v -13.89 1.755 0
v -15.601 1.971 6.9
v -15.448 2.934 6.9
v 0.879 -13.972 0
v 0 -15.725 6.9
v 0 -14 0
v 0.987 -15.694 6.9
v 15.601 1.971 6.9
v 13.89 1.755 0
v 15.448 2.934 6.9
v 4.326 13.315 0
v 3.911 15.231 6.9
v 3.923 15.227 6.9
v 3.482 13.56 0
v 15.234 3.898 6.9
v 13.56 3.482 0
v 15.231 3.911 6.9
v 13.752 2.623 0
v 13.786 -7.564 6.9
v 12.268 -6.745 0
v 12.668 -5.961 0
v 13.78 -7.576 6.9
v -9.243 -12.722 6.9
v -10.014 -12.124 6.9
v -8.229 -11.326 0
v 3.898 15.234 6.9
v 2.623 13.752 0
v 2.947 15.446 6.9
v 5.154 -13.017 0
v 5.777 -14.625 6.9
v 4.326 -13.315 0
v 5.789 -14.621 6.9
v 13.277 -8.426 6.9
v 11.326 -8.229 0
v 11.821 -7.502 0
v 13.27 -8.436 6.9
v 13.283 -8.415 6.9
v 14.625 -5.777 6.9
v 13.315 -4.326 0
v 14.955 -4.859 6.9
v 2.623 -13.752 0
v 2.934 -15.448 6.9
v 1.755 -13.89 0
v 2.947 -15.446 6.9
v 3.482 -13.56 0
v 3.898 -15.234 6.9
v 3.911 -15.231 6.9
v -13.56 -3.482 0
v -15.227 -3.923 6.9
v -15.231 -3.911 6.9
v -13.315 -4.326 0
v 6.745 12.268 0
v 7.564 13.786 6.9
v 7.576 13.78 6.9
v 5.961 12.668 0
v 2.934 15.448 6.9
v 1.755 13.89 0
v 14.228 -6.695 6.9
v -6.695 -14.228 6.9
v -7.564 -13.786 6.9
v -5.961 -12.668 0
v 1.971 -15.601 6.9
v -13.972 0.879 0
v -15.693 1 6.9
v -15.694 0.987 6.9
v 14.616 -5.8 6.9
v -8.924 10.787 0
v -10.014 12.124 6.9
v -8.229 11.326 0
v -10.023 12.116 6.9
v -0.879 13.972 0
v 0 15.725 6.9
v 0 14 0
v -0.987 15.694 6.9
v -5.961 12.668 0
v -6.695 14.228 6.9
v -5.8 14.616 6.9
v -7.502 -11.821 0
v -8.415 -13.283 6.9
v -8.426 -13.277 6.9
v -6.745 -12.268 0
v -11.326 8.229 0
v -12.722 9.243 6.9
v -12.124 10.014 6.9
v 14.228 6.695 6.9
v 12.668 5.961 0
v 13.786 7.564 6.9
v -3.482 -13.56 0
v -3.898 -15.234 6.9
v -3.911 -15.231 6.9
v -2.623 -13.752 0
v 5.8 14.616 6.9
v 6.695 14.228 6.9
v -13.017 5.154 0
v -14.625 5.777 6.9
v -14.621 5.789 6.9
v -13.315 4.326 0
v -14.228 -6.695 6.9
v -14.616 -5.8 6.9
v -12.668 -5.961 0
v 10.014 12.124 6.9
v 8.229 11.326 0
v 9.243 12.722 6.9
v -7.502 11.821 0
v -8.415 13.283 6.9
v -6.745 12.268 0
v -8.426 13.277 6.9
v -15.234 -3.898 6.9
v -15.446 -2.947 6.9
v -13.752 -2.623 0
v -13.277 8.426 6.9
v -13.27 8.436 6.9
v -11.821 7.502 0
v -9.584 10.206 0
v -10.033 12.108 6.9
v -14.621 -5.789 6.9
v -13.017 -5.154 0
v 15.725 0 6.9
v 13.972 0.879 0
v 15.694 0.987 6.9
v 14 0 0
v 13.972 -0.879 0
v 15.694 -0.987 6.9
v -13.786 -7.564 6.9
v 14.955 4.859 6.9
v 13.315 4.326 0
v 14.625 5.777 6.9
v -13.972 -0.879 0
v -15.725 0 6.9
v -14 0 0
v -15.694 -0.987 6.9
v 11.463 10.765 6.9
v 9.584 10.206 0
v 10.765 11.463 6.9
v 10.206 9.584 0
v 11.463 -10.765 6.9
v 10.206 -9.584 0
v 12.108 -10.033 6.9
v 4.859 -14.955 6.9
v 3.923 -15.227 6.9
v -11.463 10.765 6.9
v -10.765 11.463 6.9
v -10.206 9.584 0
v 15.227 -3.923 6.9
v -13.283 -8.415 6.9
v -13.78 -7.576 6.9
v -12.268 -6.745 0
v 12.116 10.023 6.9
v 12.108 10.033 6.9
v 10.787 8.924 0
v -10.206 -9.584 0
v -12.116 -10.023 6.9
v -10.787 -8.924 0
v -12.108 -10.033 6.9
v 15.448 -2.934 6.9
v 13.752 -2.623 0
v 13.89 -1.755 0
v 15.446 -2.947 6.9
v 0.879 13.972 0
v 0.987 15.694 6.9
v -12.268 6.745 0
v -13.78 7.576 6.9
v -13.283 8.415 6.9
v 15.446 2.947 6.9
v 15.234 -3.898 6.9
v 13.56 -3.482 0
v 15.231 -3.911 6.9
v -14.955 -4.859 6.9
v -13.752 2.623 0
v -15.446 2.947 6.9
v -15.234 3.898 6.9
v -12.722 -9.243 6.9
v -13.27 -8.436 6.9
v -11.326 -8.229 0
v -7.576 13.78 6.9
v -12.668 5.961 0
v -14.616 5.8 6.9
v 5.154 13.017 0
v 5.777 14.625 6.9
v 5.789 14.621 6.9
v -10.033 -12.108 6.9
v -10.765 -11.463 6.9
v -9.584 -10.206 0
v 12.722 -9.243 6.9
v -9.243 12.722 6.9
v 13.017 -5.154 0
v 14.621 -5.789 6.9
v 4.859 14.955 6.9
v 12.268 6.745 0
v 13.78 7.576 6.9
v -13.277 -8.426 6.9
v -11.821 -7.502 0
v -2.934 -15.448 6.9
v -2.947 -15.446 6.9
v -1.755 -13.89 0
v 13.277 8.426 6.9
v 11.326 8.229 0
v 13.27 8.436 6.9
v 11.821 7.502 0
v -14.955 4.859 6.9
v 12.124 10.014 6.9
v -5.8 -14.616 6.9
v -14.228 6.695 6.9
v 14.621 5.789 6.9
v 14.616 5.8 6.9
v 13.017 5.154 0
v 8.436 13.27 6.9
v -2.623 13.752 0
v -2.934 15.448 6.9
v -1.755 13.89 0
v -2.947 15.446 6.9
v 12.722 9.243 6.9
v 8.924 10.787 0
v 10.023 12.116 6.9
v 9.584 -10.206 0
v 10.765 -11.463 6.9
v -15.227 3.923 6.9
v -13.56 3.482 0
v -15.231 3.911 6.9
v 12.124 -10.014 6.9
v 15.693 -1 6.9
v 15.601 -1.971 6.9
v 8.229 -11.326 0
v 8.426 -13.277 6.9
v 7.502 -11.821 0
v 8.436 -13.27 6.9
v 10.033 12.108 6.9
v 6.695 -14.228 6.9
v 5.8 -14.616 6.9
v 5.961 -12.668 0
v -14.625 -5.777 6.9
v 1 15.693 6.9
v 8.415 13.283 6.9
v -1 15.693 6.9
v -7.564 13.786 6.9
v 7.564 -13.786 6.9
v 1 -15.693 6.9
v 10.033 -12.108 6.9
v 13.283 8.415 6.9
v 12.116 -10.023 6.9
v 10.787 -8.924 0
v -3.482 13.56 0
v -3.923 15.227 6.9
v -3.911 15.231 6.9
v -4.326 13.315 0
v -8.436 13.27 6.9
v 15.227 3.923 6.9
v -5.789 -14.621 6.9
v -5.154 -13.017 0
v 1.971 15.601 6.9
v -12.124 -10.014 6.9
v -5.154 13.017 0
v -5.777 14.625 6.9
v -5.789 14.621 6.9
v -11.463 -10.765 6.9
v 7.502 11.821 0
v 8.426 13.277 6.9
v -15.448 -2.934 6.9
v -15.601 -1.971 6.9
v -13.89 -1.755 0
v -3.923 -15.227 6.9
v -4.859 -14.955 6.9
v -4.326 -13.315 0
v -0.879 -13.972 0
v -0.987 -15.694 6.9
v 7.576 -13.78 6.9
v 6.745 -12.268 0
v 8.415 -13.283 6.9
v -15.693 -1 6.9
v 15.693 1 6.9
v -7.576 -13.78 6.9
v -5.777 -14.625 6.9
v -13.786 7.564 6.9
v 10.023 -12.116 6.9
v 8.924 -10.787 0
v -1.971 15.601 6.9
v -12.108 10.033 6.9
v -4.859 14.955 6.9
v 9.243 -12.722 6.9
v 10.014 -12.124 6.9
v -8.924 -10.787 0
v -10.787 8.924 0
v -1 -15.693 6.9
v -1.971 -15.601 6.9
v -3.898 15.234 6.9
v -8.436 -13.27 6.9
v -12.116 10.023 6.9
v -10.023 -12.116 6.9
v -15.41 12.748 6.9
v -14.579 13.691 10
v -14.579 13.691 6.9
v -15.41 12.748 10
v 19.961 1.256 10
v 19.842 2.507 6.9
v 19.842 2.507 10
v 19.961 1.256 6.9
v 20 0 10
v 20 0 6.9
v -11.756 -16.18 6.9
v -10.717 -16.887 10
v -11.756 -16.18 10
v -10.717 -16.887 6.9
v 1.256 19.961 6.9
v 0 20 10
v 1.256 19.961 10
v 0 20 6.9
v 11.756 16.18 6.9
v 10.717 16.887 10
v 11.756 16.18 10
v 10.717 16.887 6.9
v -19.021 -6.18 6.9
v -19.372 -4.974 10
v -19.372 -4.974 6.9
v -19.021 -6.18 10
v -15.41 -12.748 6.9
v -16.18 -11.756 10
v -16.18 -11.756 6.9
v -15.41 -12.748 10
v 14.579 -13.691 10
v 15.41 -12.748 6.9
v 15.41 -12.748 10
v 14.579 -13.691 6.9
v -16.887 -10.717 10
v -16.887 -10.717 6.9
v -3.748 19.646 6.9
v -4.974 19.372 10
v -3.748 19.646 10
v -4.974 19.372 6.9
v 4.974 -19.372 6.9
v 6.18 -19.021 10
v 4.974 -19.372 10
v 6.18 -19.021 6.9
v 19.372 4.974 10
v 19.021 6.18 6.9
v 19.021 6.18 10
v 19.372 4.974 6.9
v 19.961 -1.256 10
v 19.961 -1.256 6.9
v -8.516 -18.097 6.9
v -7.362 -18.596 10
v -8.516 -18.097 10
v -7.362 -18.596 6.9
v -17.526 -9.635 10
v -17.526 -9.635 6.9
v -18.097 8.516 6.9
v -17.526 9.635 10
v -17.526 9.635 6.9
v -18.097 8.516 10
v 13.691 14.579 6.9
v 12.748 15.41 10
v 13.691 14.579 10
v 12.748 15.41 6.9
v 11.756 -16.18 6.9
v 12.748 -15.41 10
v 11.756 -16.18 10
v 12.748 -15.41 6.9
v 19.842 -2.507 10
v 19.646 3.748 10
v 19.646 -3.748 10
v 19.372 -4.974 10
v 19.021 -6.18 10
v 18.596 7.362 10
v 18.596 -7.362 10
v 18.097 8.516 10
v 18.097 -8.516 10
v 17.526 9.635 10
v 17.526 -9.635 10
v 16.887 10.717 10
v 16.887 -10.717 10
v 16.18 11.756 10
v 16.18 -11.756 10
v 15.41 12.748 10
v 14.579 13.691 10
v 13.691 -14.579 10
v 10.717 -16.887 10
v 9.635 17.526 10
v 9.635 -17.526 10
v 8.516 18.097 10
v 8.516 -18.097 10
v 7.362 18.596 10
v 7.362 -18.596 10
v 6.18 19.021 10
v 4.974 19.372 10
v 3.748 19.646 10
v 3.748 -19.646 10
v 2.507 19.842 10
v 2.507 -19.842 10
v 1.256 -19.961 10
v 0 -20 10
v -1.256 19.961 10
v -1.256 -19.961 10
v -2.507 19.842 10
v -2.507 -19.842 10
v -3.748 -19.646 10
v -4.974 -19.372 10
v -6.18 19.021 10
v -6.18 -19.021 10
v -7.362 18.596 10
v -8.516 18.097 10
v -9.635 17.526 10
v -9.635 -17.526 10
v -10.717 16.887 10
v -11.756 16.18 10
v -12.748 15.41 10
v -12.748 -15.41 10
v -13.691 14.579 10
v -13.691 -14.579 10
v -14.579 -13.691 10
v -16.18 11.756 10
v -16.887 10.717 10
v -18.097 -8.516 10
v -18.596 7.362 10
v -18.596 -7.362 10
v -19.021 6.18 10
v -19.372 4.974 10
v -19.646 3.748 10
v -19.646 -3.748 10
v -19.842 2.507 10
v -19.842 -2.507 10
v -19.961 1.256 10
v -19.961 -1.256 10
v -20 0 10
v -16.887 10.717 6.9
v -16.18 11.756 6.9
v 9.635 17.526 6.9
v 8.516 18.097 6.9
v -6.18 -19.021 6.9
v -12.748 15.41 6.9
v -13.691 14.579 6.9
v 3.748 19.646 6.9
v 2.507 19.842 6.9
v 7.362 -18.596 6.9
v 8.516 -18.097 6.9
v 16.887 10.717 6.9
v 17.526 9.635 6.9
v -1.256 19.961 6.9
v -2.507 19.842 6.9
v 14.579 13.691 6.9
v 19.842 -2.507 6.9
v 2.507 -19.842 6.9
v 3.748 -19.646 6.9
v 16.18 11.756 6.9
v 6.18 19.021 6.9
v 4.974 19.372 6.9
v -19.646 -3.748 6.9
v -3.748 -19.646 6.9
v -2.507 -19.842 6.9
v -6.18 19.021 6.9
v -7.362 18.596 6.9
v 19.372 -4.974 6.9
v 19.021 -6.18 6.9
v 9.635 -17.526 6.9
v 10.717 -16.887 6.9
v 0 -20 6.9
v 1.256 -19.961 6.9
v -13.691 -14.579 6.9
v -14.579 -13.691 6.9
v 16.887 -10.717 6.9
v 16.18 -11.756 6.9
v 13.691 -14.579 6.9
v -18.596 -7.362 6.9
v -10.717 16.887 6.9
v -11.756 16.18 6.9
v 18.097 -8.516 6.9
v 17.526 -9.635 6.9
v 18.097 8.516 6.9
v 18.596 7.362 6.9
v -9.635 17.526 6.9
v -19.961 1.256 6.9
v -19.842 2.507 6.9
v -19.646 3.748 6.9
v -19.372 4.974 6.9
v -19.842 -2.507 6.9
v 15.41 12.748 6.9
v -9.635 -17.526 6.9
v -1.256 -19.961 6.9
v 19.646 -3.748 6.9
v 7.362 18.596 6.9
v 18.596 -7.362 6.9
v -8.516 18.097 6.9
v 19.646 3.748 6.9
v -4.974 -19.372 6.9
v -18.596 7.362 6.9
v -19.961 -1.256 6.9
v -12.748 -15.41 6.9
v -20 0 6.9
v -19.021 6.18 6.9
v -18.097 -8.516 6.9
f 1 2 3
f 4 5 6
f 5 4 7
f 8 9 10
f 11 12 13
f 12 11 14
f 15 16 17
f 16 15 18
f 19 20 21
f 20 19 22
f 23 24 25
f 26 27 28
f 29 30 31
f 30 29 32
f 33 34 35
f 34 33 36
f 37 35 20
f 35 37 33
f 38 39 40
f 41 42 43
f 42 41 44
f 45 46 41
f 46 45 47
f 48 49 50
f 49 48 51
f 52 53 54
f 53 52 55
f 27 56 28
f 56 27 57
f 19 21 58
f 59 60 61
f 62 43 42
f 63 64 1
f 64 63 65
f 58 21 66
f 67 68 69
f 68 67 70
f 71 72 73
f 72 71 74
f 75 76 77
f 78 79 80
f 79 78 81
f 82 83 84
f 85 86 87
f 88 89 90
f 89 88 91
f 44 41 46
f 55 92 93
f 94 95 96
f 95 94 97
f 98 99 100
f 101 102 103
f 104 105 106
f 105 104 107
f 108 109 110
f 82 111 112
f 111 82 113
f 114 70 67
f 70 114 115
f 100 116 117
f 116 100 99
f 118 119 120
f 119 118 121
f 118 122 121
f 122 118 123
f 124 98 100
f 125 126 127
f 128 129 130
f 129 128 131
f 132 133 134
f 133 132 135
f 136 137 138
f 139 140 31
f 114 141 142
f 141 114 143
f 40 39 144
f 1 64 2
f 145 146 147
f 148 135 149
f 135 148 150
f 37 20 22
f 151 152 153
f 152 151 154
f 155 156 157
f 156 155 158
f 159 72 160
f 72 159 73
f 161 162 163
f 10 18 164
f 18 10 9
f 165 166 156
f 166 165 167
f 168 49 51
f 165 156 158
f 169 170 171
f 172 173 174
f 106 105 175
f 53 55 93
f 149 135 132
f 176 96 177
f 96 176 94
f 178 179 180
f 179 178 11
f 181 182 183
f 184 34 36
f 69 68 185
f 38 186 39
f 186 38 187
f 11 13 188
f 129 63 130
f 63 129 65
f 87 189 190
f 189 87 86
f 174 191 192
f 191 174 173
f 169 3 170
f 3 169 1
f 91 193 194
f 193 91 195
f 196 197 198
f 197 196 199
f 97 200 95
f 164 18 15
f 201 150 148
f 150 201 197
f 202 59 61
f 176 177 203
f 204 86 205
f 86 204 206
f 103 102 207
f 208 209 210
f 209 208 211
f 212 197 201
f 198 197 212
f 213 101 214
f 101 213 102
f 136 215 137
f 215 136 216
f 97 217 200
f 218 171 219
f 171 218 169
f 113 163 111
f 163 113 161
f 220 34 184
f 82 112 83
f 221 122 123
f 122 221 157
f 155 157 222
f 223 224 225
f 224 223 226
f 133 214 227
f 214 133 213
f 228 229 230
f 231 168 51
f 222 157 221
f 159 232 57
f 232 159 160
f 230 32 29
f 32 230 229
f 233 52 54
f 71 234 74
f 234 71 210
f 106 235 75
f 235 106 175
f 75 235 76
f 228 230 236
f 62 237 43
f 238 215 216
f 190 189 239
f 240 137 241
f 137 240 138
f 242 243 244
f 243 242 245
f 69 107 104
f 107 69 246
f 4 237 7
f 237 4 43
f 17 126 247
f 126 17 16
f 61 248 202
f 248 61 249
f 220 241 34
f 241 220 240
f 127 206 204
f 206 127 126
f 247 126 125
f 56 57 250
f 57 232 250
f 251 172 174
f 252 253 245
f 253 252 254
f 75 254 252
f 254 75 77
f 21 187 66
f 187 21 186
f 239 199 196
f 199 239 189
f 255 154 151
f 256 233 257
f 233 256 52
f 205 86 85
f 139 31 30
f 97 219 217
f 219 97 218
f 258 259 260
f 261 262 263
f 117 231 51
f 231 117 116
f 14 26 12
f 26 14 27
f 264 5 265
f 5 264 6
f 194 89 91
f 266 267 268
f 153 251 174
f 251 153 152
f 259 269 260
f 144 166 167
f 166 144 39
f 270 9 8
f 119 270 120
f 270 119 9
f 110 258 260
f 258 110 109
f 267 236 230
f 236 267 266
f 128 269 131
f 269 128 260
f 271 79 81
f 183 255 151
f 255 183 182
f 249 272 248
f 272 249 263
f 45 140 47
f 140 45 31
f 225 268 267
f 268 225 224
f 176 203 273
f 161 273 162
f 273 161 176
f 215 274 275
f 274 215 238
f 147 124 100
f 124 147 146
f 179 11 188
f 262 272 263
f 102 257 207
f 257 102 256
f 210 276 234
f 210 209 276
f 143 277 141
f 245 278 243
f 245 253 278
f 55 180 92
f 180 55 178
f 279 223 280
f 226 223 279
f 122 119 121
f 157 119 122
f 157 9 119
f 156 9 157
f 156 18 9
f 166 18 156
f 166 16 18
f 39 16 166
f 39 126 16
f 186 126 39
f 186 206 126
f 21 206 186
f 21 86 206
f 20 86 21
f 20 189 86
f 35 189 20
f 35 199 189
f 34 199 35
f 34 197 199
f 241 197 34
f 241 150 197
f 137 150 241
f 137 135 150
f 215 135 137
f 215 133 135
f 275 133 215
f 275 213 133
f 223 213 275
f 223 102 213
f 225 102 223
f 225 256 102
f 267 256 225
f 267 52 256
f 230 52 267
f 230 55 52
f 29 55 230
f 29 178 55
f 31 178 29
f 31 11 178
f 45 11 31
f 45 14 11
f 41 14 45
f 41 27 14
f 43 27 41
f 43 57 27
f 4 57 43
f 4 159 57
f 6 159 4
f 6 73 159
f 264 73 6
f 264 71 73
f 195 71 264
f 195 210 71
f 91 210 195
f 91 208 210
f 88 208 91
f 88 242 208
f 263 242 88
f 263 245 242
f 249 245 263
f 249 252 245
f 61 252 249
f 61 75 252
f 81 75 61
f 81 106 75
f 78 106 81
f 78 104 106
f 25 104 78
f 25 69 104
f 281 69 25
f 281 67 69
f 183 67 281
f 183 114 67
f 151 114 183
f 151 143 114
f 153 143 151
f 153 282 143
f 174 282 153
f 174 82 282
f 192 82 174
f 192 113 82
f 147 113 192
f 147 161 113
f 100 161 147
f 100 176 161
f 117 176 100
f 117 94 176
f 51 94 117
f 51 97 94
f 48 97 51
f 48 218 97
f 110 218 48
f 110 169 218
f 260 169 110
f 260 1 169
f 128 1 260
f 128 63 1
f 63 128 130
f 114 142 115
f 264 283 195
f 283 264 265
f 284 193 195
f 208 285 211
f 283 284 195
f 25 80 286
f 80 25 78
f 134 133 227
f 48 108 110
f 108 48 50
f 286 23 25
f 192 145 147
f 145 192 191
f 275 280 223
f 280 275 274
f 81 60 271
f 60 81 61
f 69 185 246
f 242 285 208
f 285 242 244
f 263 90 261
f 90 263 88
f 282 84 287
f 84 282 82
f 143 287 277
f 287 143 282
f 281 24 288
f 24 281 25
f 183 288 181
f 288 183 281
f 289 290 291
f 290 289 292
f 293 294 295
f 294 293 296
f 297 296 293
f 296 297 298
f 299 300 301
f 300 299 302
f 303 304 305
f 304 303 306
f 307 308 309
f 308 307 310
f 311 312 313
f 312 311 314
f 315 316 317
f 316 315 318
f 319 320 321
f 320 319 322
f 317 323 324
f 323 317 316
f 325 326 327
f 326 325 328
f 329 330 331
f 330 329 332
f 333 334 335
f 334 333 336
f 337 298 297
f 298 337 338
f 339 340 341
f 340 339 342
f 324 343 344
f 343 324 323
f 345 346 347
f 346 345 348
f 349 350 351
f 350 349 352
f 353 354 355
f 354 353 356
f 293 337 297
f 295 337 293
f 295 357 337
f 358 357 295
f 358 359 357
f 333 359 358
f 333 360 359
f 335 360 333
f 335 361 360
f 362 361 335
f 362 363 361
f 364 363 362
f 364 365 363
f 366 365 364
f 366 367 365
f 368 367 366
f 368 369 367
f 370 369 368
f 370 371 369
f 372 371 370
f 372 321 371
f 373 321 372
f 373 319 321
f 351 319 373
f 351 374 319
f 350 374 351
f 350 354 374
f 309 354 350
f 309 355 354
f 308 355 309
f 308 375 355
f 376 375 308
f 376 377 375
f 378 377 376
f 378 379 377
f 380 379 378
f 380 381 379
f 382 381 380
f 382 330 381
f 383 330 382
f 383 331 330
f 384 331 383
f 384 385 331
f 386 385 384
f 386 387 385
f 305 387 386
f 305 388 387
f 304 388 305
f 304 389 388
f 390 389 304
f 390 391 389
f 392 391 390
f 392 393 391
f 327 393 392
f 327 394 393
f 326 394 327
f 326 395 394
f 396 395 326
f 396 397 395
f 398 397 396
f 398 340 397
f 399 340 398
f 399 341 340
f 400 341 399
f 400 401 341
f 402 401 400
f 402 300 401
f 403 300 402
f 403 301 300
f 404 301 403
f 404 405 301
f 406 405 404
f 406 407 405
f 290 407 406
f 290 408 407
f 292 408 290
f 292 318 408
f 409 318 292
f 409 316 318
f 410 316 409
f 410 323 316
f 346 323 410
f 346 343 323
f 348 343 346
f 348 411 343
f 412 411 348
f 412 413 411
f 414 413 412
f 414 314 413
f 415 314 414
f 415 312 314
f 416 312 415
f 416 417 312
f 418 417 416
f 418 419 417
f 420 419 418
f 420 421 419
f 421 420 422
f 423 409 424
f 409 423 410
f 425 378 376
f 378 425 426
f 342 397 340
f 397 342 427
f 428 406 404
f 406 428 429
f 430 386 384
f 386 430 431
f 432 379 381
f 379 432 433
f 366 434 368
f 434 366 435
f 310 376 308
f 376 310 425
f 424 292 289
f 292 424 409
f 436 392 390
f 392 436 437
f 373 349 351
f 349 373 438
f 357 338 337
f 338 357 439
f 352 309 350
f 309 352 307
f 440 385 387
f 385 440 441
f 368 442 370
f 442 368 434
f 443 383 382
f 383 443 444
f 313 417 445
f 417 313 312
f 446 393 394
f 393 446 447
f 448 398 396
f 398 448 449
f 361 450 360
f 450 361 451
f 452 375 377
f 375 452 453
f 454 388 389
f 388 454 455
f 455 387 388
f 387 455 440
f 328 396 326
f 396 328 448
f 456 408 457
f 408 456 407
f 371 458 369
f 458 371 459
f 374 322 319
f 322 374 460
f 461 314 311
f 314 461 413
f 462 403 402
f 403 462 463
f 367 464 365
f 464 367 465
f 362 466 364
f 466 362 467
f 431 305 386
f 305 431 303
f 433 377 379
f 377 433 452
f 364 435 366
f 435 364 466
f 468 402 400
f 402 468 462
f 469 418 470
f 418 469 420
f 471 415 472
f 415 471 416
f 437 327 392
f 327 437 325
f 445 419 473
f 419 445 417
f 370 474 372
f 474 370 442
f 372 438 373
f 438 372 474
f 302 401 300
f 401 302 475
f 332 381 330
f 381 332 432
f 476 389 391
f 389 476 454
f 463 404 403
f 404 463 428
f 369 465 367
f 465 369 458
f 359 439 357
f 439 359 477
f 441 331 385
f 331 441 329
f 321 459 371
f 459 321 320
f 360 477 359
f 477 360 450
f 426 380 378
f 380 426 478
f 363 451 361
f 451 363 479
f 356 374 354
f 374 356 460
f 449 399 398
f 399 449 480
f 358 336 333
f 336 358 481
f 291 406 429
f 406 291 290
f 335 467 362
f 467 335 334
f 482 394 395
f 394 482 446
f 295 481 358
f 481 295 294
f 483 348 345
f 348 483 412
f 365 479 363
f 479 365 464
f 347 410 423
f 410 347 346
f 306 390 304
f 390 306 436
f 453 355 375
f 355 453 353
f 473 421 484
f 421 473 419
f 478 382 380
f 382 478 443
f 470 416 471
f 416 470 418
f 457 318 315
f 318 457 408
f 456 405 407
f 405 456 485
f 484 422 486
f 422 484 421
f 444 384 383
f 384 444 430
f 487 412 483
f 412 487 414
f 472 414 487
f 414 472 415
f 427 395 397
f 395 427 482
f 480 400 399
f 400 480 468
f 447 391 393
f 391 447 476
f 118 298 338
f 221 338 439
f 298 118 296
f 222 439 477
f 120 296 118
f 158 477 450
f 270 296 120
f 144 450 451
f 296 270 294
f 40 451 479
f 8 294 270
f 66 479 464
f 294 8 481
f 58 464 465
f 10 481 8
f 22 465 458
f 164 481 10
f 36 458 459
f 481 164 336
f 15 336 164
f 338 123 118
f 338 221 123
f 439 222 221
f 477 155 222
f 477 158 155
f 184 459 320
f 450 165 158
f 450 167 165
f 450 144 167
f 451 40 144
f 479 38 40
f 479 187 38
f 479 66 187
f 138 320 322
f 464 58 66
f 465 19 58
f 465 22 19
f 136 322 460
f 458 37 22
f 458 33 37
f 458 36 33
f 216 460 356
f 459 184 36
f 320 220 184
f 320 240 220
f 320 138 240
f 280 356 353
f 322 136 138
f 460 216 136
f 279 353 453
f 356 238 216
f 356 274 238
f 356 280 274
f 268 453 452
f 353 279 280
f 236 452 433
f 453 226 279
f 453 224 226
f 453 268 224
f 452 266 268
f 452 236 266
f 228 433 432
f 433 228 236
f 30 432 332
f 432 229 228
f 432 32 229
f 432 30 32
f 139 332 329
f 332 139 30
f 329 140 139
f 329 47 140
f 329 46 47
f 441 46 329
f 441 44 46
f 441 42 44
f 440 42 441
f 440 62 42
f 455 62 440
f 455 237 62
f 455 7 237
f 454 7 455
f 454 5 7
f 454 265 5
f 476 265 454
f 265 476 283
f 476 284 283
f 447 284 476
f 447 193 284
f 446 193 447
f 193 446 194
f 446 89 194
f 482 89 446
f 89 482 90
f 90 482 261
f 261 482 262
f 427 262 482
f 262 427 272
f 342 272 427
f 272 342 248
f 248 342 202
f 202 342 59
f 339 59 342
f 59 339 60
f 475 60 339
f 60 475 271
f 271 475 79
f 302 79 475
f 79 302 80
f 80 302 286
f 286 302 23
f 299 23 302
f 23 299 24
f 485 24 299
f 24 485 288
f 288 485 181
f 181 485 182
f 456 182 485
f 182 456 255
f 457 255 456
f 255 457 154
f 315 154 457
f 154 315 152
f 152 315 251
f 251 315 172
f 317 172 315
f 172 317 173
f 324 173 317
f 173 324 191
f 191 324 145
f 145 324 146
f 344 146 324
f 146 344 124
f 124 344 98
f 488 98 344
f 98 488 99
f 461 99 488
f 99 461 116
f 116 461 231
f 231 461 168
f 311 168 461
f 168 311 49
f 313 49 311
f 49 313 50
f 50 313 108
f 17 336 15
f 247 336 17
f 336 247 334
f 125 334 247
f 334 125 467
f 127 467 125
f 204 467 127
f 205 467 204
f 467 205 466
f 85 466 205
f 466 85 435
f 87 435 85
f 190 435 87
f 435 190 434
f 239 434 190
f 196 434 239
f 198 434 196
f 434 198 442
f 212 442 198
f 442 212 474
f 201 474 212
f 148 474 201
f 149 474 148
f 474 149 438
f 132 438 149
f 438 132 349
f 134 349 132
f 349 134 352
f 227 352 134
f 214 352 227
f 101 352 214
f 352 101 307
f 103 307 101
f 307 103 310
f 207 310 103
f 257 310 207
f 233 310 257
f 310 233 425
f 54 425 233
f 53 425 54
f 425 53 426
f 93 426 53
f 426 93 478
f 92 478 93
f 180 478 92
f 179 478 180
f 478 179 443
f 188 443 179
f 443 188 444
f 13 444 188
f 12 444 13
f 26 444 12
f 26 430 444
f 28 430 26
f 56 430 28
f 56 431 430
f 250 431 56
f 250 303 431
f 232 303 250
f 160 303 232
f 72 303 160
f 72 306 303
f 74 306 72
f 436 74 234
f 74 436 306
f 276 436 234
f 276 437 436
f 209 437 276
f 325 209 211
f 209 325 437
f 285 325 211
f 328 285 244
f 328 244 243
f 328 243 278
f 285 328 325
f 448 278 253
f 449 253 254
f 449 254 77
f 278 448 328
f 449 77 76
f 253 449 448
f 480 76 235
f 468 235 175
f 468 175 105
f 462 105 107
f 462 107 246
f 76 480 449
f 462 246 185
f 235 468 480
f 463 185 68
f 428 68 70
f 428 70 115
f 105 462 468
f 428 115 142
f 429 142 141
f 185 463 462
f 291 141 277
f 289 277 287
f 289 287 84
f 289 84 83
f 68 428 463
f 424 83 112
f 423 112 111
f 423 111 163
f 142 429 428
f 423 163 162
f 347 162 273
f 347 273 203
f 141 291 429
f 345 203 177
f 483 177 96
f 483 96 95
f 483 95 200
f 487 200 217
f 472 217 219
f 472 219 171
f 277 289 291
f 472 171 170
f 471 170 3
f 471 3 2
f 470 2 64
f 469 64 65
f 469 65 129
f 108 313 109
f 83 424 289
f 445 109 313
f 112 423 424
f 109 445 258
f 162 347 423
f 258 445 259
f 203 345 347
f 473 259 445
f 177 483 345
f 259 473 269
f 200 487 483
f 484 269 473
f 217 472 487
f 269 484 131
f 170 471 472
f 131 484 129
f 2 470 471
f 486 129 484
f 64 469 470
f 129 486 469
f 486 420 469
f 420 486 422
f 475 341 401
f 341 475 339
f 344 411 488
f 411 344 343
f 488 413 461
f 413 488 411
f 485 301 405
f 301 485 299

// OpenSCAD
$fn=100;

difference(){
    union(){
        //base
        cylinder(d1=28, d2=31.5, h=7);
        //top
        translate([0,0,6.9])cylinder(d1=40, d2=40, h=3.1);
    }// Engrave a name
    translate([-35/2, -12/2+2, 10-1])
    resize(newsize=[35,12,2])
    linear_extrude(height=2) import ("asun.dxf");
}
